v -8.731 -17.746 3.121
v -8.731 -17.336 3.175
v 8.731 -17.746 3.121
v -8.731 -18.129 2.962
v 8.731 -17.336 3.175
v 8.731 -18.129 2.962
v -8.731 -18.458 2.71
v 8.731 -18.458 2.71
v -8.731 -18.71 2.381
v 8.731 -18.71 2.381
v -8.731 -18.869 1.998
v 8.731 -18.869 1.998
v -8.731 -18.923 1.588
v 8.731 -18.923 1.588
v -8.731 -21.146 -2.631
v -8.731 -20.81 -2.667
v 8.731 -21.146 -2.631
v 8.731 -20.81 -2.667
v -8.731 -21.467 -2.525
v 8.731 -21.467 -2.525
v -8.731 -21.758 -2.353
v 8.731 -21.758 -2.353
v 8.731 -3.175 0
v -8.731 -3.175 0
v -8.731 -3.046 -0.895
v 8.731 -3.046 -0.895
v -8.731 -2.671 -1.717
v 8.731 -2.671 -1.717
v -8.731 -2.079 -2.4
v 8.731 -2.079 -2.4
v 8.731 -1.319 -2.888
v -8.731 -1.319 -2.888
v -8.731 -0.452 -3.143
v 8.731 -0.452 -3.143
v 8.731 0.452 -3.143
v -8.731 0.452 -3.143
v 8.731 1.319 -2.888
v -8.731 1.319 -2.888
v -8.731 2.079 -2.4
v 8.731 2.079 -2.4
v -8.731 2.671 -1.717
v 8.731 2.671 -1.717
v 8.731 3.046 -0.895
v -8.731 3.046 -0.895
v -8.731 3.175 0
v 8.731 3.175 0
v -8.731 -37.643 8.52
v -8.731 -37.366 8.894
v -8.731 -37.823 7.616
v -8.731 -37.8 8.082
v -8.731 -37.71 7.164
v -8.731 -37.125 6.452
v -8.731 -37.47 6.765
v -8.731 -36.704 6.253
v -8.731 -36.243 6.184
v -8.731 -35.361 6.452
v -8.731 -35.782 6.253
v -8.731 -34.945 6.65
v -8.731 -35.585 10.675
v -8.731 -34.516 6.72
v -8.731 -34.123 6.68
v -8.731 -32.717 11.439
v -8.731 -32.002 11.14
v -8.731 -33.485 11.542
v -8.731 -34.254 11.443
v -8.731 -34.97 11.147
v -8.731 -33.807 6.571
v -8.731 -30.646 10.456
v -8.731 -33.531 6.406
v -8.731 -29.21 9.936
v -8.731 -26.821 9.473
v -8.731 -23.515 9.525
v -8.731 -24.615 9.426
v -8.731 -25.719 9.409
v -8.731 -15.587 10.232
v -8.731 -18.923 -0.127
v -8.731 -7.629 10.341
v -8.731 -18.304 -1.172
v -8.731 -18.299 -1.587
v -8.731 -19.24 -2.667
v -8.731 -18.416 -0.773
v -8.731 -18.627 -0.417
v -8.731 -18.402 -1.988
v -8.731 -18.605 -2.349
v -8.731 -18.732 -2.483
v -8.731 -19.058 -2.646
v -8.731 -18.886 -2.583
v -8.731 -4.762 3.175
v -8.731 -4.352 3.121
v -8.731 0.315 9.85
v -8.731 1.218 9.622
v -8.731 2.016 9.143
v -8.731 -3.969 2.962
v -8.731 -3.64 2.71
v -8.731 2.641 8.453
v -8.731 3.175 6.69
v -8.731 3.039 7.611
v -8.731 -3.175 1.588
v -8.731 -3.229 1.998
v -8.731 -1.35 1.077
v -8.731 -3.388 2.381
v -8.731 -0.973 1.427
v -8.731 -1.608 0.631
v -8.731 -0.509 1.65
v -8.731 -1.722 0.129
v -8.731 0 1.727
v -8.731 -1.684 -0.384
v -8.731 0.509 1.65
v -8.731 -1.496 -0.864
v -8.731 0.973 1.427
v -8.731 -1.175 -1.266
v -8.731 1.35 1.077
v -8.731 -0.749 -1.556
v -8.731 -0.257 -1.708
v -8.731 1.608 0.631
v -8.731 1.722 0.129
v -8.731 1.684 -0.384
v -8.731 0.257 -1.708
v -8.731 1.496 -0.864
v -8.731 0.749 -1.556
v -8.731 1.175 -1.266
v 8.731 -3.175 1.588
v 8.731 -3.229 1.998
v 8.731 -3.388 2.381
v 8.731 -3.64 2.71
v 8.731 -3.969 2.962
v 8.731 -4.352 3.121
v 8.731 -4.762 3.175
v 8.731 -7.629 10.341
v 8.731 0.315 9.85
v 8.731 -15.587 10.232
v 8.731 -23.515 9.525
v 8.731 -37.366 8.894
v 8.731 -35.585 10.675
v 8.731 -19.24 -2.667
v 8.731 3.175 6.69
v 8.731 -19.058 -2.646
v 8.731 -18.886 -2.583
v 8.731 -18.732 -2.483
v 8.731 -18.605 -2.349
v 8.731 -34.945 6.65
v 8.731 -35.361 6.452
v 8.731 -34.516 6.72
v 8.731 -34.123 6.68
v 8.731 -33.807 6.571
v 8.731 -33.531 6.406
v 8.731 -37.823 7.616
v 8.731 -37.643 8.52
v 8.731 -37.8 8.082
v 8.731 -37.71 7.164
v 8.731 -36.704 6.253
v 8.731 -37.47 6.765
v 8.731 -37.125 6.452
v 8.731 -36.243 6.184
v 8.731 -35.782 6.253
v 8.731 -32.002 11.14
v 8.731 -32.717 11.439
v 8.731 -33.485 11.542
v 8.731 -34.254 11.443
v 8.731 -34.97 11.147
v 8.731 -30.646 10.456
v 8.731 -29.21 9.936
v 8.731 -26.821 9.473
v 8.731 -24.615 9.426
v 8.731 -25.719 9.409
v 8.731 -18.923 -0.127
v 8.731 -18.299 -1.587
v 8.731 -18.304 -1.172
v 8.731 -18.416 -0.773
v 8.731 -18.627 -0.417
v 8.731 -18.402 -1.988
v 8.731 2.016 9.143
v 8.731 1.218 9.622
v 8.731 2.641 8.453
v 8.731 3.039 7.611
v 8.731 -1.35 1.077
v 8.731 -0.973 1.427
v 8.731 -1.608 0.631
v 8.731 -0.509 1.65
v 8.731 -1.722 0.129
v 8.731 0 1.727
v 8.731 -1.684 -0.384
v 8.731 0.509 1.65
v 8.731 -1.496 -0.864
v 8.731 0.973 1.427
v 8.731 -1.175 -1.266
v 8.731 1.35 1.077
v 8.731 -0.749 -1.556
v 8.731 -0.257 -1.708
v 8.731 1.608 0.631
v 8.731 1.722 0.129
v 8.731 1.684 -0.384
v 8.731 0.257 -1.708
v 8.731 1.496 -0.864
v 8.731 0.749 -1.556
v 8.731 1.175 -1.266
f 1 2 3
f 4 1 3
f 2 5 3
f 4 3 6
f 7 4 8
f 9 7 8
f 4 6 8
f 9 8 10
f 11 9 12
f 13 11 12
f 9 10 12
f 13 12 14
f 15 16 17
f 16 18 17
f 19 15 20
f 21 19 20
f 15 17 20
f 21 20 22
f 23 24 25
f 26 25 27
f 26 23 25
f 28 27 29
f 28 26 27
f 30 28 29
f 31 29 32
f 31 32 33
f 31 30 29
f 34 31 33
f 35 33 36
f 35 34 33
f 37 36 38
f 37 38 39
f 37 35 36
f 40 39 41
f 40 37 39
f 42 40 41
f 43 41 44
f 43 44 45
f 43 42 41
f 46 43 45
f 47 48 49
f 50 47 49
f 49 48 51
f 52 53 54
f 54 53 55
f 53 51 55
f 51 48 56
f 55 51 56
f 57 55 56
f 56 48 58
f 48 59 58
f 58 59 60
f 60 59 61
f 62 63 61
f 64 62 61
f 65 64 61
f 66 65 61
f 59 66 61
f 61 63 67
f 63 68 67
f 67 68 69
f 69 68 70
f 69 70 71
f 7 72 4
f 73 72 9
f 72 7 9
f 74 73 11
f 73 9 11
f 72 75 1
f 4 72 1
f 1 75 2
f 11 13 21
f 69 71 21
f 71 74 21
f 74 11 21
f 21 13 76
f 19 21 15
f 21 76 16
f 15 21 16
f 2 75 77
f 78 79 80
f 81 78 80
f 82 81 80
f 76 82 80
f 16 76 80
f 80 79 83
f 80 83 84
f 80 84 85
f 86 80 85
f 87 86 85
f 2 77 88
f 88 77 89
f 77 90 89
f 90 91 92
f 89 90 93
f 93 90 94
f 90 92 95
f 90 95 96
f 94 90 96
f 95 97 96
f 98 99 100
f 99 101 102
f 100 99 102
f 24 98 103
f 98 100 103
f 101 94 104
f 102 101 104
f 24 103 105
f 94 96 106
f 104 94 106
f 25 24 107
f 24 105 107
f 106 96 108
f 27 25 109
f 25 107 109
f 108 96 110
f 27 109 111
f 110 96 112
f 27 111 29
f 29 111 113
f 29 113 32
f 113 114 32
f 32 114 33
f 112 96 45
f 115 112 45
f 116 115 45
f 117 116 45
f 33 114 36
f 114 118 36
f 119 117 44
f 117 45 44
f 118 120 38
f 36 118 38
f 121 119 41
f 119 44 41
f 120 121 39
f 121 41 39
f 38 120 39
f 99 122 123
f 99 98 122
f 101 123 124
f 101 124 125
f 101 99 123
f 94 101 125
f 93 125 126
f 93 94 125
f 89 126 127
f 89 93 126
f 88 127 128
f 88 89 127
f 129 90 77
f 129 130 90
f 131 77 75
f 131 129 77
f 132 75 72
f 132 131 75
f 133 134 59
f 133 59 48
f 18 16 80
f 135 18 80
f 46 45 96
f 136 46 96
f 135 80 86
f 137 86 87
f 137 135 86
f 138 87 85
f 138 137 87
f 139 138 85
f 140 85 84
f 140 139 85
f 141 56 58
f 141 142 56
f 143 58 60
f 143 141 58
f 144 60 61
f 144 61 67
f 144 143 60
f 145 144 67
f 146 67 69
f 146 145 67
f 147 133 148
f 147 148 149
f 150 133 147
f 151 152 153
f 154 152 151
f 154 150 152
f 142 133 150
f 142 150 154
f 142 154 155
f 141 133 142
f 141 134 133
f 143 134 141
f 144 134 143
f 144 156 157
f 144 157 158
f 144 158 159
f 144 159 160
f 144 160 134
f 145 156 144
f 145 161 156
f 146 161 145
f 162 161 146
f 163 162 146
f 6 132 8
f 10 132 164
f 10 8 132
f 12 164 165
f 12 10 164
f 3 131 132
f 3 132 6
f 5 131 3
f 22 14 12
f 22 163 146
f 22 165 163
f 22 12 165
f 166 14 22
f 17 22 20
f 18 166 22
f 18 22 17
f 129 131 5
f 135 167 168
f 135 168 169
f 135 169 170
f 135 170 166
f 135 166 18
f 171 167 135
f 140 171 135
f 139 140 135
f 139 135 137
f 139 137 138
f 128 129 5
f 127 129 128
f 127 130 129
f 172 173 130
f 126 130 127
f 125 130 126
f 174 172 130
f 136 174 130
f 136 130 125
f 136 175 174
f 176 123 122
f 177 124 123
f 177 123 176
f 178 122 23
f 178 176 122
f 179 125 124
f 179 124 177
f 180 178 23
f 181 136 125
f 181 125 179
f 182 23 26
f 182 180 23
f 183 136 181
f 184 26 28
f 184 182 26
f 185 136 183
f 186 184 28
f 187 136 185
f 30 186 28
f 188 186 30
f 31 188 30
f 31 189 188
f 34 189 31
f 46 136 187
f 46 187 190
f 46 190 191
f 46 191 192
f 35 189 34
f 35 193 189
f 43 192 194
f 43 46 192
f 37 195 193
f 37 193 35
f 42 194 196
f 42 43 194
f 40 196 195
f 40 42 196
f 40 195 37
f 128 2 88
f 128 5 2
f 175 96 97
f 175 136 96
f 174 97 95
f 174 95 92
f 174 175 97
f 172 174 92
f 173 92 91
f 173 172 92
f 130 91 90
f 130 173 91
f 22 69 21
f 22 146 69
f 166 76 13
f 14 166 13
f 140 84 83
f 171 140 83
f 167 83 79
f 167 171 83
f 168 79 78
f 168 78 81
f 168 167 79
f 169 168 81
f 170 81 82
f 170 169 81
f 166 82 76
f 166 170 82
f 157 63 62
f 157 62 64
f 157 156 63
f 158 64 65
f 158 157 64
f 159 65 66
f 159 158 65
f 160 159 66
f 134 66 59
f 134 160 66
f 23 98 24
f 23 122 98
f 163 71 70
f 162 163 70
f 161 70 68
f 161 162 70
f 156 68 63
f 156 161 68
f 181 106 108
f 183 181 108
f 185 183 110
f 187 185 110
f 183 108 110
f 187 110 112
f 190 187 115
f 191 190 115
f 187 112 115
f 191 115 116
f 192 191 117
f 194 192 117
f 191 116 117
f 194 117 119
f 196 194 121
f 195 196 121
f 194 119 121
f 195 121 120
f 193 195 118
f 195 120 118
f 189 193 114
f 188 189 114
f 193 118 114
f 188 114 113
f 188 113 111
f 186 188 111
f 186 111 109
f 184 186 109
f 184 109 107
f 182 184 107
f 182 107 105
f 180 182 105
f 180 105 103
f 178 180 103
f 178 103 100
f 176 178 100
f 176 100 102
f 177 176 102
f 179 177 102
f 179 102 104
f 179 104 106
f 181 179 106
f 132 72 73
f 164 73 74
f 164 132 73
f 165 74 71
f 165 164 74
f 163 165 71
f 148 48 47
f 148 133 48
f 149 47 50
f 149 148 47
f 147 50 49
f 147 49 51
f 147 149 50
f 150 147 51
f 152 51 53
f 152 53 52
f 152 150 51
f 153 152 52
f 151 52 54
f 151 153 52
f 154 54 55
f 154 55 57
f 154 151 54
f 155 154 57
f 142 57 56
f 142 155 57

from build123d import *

# Parameters (mm, degrees)
EXTRUDE1_DEPTH              = 8.73125
FILLET1_R                   = 3.175
FILLET2_R                   = 1.5875
FILLET3_R                   = 12.7
FILLET5_R                   = 0.79375
F_29_0_136_DIAMETER_HOLE1_D = 3.4544


with BuildPart() as part:
    # Sketch1 → Extrude1 (new, symmetric)
    with BuildSketch(Plane(origin=(0, 0, 0), x_dir=(0, 0, -1), z_dir=(1, 0, 0))):
        with BuildLine():
            Line((0, 3.175), (-9.525, 3.175))
            ThreePointArc((-9.525, 3.175), (-10.371241591, -10.169917472), (-9.525, -23.514834943))
            ThreePointArc((-9.525, -23.514834943), (-9.557235696, -27.523032937), (-10.655093305, -31.378081441))
            ThreePointArc((-10.655093305, -31.378081441), (-11.542308189, -33.477423108), (-10.675148068, -35.585127786))
            Line((-10.675148068, -35.585127786), (-9.43326403, -36.827011824))
            Line((-9.43326403, -36.827011824), (-8.894448663, -37.365827191))
            ThreePointArc((-8.894448663, -37.365827191), (-6.649384633, -37.365827191), (-6.649384633, -35.120763161))
            Line((-6.649384633, -35.120763161), (-7.1882, -34.581947794))
            Line((-7.1882, -34.581947794), (2.667, -21.336))
            Line((2.667, -21.336), (2.667, -18.923))
            ThreePointArc((2.667, -18.923), (1.397, -18.288), (0.127, -18.923))
            Line((0.127, -18.923), (-3.175, -18.923))
            Line((-3.175, -18.923), (-3.175, -3.175))
            Line((-3.175, -3.175), (0, -3.175))
            ThreePointArc((0, -3.175), (3.175, 0), (0, 3.175))
        make_face()
    extrude(amount=EXTRUDE1_DEPTH, both=True)

    # Fillet1
    fillet1_edges = [part.edges().sort_by_distance(p)[0] for p in [
        (0, 3.175, 9.525),
    ]]
    fillet(fillet1_edges, radius=FILLET1_R)

    # Fillet2
    fillet2_edges = [part.edges().sort_by_distance(p)[0] for p in [
        (0, -3.175, 3.175),
        (0, -34.581947794, 7.1882),
        (0, -21.336, -2.667),
        (0, -18.923, 3.175),
    ]]
    fillet(fillet2_edges, radius=FILLET2_R)

    # Fillet3
    fillet3_edges = [part.edges().sort_by_distance(p)[0] for p in [
        (0, -31.378081441, 10.655093305),
    ]]
    fillet(fillet3_edges, radius=FILLET3_R)

    # Fillet5
    fillet5_edges = [part.edges().sort_by_distance(p)[0] for p in [
        (0, -18.923, -2.667),
    ]]
    fillet(fillet5_edges, radius=FILLET5_R)

    # #29 (0.136) Diameter Hole1 (through all)
    with Locations(Plane(origin=(8.73125, 0, 0), x_dir=(0, 0, -1), z_dir=(1, 0, 0))):
        with Locations((0, 0)):
            Hole(F_29_0_136_DIAMETER_HOLE1_D / 2)


solid = part.part
